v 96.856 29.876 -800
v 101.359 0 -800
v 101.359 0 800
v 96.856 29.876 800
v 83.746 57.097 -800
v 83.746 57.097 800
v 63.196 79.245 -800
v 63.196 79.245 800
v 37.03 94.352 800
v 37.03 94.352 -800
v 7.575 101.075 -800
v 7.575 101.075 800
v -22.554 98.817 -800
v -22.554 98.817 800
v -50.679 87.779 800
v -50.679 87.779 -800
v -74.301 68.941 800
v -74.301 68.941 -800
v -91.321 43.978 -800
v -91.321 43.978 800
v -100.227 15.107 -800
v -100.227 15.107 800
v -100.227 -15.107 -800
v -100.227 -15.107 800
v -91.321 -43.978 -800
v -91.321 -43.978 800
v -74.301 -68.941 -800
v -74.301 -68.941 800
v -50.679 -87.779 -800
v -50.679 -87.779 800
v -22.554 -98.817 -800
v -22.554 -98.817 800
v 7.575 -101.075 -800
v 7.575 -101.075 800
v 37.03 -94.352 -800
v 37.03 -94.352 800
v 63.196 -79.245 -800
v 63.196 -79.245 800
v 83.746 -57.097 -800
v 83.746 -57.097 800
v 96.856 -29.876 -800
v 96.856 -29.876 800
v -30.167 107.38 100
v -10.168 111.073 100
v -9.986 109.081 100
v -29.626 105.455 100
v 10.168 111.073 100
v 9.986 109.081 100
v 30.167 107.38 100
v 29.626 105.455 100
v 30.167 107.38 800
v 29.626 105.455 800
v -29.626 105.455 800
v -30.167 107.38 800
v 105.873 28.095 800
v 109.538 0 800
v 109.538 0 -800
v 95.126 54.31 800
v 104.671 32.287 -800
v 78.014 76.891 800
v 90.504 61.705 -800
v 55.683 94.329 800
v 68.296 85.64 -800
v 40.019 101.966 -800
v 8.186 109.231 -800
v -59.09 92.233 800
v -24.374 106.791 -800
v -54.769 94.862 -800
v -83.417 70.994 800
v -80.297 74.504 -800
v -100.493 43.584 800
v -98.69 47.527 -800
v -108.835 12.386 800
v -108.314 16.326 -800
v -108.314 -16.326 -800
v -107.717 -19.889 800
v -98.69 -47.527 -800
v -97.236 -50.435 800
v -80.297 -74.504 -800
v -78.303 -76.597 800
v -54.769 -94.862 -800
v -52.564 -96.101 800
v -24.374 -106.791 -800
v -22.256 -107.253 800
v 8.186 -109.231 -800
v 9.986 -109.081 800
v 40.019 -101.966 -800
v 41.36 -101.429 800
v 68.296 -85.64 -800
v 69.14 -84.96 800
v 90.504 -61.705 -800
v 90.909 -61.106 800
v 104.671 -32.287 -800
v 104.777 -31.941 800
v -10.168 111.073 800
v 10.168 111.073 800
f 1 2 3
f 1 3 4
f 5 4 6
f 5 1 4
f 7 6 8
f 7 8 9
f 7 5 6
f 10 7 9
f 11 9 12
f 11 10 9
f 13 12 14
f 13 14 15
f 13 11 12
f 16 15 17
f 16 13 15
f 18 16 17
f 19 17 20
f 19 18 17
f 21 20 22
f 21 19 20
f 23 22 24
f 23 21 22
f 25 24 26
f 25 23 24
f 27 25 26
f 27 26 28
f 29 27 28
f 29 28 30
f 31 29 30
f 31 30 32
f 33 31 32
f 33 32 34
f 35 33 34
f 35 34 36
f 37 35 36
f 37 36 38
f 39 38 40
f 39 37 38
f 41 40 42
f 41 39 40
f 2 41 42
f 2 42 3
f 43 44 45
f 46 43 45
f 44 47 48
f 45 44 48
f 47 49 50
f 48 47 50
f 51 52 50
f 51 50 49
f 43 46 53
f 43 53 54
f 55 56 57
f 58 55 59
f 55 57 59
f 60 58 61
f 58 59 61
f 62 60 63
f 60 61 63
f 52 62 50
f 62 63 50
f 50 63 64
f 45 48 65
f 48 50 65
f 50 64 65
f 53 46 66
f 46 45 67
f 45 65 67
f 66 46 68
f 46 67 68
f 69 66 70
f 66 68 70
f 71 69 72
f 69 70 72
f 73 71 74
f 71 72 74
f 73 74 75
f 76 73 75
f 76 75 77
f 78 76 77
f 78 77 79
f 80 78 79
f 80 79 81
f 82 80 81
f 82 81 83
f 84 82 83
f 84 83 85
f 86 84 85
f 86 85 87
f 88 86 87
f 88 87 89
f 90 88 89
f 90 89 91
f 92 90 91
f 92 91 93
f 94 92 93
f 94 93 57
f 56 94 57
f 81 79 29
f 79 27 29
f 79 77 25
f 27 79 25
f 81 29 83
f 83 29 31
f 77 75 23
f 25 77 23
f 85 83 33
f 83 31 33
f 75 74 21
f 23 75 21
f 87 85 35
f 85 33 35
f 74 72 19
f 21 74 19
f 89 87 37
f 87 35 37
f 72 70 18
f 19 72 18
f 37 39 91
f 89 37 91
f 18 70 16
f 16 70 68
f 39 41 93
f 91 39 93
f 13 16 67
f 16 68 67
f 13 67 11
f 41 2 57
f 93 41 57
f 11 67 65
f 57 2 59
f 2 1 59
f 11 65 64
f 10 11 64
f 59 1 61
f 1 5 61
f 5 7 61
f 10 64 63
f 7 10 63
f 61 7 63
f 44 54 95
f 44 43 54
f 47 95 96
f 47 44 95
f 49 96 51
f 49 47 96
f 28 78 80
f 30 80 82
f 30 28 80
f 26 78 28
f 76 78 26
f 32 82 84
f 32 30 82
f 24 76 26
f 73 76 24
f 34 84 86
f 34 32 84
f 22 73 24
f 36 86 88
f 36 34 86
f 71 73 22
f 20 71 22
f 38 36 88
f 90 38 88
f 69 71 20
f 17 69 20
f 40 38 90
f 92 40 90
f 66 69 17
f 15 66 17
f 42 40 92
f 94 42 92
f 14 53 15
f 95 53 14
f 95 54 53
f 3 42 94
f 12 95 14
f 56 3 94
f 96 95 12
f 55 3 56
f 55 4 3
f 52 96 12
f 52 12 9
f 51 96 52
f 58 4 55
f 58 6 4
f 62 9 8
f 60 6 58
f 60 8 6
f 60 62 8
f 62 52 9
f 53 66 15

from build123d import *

# Parameters (mm, degrees)
BOSS_EXTRUDE1_DEPTH      = 800
BOSS_EXTRUDE1_DEPTH_BACK = 800
SKETCH3_R                = 109.5375
SKETCH3_R_2              = 101.3587
WRAP2_SECTION_W          = 2
WRAP2_SECTION_H          = 700
WRAP2_ANGLE              = 31.384199665


with BuildPart() as part:
    # Sketch3 → Boss-Extrude1 (new, two sides: drawn at the far end of the back side and taken through both)
    with BuildSketch(Plane.XY.offset(-BOSS_EXTRUDE1_DEPTH_BACK)):
        Circle(SKETCH3_R)
        Circle(SKETCH3_R_2, mode=Mode.SUBTRACT)
    extrude(amount=BOSS_EXTRUDE1_DEPTH + BOSS_EXTRUDE1_DEPTH_BACK)

    # Wrap2 section (on wrap section) → Wrap2 (revolve)
    with BuildSketch(Plane(origin=(0, 0, 0), x_dir=(-0.27046770367687717, 0.9627290487295773, 0), z_dir=(-0.9627290487295773, -0.27046770367687717, 0))):
        with Locations((110.5375, -450)):
            Rectangle(WRAP2_SECTION_W, WRAP2_SECTION_H)
    revolve(axis=Axis((0, 0, 0), (0, 0, -1)), revolution_arc=WRAP2_ANGLE)


solid = part.part
